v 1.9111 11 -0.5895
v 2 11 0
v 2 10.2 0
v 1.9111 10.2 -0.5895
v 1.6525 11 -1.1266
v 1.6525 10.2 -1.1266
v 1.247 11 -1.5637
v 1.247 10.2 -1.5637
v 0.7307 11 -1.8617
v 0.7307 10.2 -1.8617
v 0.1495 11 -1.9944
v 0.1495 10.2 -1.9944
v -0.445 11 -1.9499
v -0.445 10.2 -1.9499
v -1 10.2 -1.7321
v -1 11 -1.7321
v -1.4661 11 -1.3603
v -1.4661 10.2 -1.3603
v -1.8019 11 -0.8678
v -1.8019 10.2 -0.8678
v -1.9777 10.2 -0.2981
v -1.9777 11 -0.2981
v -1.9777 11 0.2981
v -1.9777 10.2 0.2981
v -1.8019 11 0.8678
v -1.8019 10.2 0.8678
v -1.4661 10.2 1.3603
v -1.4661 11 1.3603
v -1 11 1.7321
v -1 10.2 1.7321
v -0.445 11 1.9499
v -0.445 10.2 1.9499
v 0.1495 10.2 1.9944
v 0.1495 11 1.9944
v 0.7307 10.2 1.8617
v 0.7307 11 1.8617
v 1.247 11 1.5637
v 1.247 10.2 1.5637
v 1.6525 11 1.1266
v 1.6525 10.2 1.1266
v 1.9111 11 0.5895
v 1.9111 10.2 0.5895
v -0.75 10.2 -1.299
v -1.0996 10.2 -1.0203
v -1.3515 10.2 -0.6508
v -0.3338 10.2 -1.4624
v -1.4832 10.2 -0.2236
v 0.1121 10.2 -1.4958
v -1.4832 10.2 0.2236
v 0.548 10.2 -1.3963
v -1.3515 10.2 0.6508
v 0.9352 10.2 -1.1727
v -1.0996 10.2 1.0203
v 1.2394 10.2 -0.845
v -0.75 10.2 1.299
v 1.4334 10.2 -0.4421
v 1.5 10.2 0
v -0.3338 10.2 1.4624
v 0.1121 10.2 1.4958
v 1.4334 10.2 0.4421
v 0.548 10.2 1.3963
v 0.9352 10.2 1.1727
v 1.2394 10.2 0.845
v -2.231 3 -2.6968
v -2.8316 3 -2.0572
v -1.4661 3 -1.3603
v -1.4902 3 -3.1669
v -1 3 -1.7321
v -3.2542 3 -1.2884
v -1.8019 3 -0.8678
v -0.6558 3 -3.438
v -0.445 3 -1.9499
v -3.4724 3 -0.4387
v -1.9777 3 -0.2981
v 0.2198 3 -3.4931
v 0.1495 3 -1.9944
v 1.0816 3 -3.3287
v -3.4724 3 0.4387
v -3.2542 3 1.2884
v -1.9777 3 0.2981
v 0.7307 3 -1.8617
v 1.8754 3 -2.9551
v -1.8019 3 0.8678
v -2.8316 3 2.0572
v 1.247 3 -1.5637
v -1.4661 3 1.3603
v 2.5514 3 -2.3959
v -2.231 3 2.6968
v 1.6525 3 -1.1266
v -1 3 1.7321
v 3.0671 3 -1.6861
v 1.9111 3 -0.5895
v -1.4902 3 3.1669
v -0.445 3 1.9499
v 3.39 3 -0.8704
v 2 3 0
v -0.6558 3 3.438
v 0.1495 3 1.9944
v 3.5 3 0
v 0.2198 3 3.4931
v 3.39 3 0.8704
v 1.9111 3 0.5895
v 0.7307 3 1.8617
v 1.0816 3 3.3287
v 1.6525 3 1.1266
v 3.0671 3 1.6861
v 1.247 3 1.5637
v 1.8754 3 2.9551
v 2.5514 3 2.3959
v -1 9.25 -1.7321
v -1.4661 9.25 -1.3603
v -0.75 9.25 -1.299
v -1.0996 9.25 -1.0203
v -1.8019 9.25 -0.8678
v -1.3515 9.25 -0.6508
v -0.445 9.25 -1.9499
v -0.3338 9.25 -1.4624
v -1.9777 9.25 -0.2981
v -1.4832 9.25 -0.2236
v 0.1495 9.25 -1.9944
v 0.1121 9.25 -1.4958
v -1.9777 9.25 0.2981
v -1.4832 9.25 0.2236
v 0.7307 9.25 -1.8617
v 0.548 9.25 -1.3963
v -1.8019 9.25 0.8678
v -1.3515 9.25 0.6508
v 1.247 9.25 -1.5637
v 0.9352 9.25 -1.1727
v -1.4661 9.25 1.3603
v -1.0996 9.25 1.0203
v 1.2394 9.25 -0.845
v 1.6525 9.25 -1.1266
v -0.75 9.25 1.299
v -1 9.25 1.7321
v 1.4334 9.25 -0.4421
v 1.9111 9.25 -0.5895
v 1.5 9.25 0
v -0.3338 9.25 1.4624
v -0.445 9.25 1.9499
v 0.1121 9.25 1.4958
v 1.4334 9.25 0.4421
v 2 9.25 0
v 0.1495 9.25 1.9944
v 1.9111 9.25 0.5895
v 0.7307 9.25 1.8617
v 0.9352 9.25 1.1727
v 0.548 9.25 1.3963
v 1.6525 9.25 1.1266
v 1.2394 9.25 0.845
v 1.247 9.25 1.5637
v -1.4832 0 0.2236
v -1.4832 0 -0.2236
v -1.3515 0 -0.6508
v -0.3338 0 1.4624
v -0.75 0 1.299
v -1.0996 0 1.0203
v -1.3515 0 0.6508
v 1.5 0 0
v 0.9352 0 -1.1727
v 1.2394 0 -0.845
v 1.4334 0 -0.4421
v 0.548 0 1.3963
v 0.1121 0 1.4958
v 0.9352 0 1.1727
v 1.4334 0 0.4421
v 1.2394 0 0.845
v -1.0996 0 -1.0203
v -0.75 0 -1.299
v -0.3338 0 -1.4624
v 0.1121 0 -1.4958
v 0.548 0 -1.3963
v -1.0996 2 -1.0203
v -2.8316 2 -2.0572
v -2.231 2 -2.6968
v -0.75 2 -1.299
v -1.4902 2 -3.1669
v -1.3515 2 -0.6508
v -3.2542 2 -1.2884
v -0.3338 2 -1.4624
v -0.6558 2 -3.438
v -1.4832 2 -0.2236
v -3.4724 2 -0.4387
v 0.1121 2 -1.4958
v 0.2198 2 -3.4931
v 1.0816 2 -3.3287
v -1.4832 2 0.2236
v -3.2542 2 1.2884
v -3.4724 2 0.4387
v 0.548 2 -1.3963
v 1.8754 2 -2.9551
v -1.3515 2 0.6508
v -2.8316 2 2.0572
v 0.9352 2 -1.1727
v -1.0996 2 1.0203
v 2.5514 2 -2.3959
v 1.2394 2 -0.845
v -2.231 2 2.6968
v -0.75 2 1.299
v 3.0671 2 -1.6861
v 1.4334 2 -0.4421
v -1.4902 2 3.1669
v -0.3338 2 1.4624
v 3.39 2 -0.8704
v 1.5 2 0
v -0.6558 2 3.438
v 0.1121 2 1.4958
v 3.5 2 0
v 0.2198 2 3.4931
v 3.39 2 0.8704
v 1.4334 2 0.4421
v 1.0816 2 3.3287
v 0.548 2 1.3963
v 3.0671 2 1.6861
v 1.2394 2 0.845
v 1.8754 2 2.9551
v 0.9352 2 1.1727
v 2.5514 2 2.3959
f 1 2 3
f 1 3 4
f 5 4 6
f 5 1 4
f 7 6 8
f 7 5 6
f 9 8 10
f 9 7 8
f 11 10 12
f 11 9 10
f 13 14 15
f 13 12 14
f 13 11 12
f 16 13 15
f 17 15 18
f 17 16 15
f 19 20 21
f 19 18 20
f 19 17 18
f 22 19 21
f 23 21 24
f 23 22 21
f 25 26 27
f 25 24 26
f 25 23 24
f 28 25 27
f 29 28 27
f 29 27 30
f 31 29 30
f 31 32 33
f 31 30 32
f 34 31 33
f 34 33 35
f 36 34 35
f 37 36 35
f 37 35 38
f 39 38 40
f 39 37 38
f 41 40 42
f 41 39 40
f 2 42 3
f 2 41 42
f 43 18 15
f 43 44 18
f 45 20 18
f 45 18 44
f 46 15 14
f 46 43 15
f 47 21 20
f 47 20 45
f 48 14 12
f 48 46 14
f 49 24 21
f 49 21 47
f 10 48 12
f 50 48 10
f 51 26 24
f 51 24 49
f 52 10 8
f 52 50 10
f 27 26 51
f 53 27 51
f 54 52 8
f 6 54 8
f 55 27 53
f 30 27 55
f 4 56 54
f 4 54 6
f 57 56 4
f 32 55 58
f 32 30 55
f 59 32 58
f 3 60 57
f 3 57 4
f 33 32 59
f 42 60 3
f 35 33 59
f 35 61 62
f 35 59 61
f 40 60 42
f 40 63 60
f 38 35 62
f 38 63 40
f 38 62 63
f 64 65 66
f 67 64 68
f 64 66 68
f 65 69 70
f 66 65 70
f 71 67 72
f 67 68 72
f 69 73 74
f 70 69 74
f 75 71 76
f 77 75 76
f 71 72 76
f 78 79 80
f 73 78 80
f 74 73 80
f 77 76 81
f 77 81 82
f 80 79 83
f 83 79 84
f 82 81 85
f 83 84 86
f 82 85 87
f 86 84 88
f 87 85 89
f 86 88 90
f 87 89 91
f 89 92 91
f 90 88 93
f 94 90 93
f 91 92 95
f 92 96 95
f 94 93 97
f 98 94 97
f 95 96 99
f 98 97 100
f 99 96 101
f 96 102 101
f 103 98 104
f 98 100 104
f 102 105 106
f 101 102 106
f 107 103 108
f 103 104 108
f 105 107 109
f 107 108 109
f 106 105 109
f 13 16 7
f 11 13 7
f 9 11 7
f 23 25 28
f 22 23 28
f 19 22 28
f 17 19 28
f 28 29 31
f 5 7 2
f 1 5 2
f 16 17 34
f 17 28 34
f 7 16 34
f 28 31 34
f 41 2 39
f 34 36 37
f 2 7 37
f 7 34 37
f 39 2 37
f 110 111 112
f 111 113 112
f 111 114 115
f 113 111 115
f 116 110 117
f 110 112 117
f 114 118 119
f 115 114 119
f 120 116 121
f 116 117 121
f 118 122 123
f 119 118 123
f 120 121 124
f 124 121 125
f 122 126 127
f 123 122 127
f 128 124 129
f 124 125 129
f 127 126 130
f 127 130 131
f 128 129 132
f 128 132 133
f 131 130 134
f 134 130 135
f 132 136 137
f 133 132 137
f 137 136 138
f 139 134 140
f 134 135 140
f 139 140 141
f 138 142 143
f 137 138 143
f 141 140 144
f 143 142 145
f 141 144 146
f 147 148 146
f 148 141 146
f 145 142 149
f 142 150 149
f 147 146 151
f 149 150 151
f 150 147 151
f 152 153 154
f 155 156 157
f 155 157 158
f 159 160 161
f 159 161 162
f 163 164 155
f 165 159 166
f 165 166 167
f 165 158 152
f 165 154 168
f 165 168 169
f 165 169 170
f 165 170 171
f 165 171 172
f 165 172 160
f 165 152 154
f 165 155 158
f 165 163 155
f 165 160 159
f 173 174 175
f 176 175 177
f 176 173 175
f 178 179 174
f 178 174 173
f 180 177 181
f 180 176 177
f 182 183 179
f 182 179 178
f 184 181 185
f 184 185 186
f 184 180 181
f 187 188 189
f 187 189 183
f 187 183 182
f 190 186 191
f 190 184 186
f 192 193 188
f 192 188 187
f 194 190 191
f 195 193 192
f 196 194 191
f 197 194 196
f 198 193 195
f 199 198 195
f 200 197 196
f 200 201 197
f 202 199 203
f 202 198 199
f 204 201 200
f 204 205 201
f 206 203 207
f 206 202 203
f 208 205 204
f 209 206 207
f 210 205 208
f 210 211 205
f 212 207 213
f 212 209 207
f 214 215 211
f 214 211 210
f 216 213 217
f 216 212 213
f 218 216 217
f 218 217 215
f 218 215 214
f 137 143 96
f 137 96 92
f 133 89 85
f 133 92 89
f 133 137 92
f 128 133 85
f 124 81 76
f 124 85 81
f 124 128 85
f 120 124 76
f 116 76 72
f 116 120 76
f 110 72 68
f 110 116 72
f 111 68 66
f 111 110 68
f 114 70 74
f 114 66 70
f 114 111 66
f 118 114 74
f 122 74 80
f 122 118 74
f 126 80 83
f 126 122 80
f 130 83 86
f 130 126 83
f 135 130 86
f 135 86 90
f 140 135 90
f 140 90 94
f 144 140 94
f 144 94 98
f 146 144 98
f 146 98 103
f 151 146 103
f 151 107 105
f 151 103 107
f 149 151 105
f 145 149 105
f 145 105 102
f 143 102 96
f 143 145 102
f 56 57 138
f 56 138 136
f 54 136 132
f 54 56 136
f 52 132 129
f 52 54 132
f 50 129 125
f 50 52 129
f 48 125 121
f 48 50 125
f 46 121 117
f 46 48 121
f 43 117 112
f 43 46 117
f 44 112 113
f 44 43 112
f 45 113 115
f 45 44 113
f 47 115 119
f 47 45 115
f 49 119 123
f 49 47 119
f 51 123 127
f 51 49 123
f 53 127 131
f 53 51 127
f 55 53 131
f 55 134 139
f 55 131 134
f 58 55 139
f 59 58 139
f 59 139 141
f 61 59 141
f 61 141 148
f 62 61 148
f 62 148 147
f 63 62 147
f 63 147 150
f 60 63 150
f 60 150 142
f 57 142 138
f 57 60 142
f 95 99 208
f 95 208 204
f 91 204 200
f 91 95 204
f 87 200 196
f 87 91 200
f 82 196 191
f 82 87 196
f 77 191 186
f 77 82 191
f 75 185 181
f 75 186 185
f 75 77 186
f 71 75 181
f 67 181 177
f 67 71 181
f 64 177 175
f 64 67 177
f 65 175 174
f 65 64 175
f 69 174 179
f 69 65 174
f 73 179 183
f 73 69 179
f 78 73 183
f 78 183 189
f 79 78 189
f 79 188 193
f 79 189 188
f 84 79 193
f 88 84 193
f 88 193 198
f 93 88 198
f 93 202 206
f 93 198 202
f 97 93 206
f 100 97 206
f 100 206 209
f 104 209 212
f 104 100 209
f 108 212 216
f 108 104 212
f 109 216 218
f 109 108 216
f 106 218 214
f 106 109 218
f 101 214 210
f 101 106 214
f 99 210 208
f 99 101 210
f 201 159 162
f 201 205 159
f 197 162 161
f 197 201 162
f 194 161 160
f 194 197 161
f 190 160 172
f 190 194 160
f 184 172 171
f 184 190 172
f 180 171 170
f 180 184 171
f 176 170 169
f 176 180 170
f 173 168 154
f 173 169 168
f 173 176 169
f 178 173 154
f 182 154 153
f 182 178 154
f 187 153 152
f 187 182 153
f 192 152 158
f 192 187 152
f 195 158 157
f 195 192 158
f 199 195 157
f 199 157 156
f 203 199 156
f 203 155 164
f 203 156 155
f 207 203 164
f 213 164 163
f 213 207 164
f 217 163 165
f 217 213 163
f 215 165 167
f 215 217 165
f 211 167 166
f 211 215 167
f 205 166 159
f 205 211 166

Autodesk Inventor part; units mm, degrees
ref_plane "YZ Plane" through (0, 0, 0) normal (1, 0, 0) x (0, 1, 0)
ref_plane "XZ Plane" through (0, 0, 0) normal (0, 1, 0) x (-1, 0, 0)
ref_plane "XY Plane" through (0, 0, 0) normal (0, 0, 1) x (1, 0, 0)
sketch "Sketch1" plane through (0, 0, 0) normal (0, 0, 1) x (1, 0, 0)
  line L0 (0, 0) -> (1.5, 0)
  line L1 (1.5, 0) -> (1.5, 2)
  line L2 (1.5, 2) -> (0, 2)
  line L3 (0, 2) -> (0, 0)
  line L4 (0, 2) -> (3.5, 2)
  line L5 (3.5, 2) -> (3.5, 3)
  line L6 (3.5, 3) -> (0, 3)
  line L7 (0, 3) -> (0, 2)
  line L8 (0, 3) -> (2, 3)
  line L9 (2, 3) -> (2, 9.25)
  line L10 (2, 9.25) -> (0, 9.25)
  line L11 (0, 9.25) -> (0, 3)
  line L12 (0, 9.25) -> (1.5, 9.25)
  line L13 (1.5, 9.25) -> (1.5, 10.2)
  line L14 (1.5, 10.2) -> (0, 10.2)
  line L15 (0, 10.2) -> (0, 9.25)
  line L16 (0, 10.2) -> (2, 10.2)
  line L17 (2, 10.2) -> (2, 11)
  line L18 (2, 11) -> (0, 11)
  line L19 (0, 11) -> (0, 10.2)
  dimension "d8" = 4
  dimension "d9" = 3
  dimension "d10" = 8
  dimension "d11" = 9
  dimension "d12" = 11
  dimension "d13" = 0.8
  dimension "d14" = 1.75
  dimension "d16" = 7
revolve "Revolution1" add sketch "Sketch1" angle 360 about axis through (0, 9.25, 0) along (0, -1, 0)
properties part number "308-16" material "Steel"
